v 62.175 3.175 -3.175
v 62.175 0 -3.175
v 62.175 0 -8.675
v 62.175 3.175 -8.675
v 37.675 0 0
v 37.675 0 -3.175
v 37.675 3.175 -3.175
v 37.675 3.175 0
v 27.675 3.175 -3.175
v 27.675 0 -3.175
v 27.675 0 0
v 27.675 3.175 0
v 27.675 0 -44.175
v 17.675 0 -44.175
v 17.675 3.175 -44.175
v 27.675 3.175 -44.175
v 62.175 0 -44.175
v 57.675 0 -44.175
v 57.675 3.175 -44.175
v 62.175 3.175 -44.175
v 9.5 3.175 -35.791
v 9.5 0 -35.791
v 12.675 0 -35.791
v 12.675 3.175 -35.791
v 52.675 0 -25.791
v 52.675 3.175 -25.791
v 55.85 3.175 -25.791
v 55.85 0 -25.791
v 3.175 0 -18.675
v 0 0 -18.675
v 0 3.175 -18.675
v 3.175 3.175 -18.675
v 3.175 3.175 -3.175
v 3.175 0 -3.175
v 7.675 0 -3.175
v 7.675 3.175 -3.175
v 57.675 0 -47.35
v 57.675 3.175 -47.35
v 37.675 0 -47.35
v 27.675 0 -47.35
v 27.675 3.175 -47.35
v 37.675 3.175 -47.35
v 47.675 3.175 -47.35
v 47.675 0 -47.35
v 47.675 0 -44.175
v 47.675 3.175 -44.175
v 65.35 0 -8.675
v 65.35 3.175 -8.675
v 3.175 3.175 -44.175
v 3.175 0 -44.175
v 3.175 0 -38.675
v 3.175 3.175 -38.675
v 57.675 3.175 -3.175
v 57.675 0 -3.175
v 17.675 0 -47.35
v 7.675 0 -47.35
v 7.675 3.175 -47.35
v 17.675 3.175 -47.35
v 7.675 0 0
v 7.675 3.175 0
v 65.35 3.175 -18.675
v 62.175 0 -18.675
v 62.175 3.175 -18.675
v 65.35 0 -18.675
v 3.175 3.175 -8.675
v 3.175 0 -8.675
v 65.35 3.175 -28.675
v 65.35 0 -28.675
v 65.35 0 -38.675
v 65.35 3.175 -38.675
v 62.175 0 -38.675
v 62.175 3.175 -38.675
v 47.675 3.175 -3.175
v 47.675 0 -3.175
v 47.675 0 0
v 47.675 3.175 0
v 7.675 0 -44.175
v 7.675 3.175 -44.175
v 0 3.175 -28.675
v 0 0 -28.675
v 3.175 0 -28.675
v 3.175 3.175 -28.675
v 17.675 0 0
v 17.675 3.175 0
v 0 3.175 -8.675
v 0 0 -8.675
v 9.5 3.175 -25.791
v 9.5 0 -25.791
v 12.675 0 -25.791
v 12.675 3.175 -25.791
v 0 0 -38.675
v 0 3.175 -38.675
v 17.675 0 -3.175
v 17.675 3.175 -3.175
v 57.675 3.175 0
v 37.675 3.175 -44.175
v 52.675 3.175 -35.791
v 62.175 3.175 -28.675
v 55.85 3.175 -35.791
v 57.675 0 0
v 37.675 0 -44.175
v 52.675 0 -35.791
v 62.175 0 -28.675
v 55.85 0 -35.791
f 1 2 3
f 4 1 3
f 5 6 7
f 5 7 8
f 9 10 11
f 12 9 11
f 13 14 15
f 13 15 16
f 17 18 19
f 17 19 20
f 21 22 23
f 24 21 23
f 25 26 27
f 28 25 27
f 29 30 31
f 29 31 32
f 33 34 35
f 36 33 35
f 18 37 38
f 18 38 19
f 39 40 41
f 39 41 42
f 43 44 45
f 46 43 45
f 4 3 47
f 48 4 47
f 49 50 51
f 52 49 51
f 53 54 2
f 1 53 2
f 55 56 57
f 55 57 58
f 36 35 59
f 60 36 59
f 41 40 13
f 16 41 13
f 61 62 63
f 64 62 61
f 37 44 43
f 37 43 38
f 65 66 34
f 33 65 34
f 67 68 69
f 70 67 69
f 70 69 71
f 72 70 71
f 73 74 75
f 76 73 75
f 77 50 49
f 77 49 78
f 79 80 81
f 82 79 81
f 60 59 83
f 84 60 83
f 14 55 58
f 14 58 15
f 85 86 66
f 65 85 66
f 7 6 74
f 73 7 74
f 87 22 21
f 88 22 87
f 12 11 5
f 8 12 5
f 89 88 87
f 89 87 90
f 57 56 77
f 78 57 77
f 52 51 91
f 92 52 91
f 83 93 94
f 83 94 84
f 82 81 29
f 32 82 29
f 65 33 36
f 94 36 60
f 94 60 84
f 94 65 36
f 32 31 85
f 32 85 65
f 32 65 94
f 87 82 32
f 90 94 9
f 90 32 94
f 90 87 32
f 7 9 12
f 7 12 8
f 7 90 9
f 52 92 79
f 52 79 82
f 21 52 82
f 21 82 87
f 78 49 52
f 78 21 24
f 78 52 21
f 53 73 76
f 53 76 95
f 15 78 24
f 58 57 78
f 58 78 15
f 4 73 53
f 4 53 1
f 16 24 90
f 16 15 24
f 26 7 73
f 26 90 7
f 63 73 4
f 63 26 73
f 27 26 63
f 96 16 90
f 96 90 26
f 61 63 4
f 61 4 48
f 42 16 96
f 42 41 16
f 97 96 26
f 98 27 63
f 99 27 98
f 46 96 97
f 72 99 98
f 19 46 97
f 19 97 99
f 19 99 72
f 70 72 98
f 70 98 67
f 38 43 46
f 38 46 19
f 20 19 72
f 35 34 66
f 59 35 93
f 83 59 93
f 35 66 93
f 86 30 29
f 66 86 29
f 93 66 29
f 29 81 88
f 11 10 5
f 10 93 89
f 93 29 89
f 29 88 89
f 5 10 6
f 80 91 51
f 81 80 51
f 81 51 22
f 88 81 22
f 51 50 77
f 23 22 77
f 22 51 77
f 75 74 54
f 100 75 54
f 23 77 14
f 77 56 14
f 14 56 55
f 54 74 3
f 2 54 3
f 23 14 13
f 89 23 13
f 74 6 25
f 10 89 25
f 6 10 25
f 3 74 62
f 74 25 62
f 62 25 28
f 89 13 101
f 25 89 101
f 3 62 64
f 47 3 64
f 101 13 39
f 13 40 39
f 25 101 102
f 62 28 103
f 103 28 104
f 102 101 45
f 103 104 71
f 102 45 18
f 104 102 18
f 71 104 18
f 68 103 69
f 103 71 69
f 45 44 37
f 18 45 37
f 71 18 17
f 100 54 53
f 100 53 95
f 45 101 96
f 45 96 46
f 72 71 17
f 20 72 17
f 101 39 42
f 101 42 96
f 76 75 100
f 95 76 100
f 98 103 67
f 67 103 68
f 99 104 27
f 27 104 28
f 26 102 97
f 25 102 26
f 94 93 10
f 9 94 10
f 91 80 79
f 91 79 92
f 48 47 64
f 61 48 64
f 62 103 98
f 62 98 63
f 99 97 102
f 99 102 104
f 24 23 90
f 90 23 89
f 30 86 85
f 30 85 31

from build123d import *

# Parameters (mm, degrees)
SKETCH1_W           = 65.35
SKETCH1_H           = 47.35
BOSS_EXTRUDE1_DEPTH = 3.175
SKETCH2_W           = 4.5
SKETCH2_H           = 3.175
SKETCH2_W_2         = 3.175
SKETCH2_H_2         = 10
SKETCH2_W_3         = 10
CUT_EXTRUDE1_DEPTH  = 4.175
SKETCH3_W           = 3.175
SKETCH3_H           = 10
CUT_EXTRUDE2_DEPTH  = 4.175


with BuildPart() as part:
    # Sketch1 → Boss-Extrude1 (new body)
    with BuildSketch(Plane(origin=(0, 0, 0), x_dir=(1, 0, 0), z_dir=(0, 1, 0))):
        with Locations((32.675, 23.675)):
            Rectangle(SKETCH1_W, SKETCH1_H)
    extrude(amount=BOSS_EXTRUDE1_DEPTH)

    # Sketch2 → Cut-Extrude1 (cut, through all)
    with BuildSketch(Plane.XZ):
        with Locations((59.925, -45.7625)):
            Rectangle(SKETCH2_W, SKETCH2_H)
        Polygon((65.35, -38.675), (62.175, -38.675), (62.175, -44.175), (62.175, -47.35), (65.35, -47.35), align=None)
        with Locations((63.7625, -23.675)):
            Rectangle(SKETCH2_W_2, SKETCH2_H_2)
        Polygon((62.175, -8.675), (65.35, -8.675), (65.35, 0), (62.175, 0), (62.175, -3.175), align=None)
        with Locations((59.925, -1.5875)):
            Rectangle(SKETCH2_W, SKETCH2_H)
        with Locations((42.675, -1.5875)):
            Rectangle(SKETCH2_W_3, SKETCH2_H)
        with Locations((42.675, -45.7625)):
            Rectangle(SKETCH2_W_3, SKETCH2_H)
        with Locations((22.675, -45.7625)):
            Rectangle(SKETCH2_W_3, SKETCH2_H)
        with Locations((5.425, -45.7625)):
            Rectangle(SKETCH2_W, SKETCH2_H)
        Polygon((0, -47.35), (3.175, -47.35), (3.175, -44.175), (3.175, -38.675), (0, -38.675), align=None)
        with Locations((1.5875, -23.675)):
            Rectangle(SKETCH2_W_2, SKETCH2_H_2)
        Polygon((3.175, -3.175), (3.175, 0), (0, 0), (0, -8.675), (3.175, -8.675), align=None)
        with Locations((5.425, -1.5875)):
            Rectangle(SKETCH2_W, SKETCH2_H)
        with Locations((22.675, -1.5875)):
            Rectangle(SKETCH2_W_3, SKETCH2_H)
    extrude(amount=-CUT_EXTRUDE1_DEPTH, mode=Mode.SUBTRACT)

    # Sketch3 → Cut-Extrude2 (cut, through all)
    with BuildSketch(Plane.XZ):
        with Locations((54.2625, -30.791497658)):
            Rectangle(SKETCH3_W, SKETCH3_H)
        with Locations((11.0875, -30.791497658)):
            Rectangle(SKETCH3_W, SKETCH3_H)
    extrude(amount=-CUT_EXTRUDE2_DEPTH, mode=Mode.SUBTRACT)


solid = part.part
